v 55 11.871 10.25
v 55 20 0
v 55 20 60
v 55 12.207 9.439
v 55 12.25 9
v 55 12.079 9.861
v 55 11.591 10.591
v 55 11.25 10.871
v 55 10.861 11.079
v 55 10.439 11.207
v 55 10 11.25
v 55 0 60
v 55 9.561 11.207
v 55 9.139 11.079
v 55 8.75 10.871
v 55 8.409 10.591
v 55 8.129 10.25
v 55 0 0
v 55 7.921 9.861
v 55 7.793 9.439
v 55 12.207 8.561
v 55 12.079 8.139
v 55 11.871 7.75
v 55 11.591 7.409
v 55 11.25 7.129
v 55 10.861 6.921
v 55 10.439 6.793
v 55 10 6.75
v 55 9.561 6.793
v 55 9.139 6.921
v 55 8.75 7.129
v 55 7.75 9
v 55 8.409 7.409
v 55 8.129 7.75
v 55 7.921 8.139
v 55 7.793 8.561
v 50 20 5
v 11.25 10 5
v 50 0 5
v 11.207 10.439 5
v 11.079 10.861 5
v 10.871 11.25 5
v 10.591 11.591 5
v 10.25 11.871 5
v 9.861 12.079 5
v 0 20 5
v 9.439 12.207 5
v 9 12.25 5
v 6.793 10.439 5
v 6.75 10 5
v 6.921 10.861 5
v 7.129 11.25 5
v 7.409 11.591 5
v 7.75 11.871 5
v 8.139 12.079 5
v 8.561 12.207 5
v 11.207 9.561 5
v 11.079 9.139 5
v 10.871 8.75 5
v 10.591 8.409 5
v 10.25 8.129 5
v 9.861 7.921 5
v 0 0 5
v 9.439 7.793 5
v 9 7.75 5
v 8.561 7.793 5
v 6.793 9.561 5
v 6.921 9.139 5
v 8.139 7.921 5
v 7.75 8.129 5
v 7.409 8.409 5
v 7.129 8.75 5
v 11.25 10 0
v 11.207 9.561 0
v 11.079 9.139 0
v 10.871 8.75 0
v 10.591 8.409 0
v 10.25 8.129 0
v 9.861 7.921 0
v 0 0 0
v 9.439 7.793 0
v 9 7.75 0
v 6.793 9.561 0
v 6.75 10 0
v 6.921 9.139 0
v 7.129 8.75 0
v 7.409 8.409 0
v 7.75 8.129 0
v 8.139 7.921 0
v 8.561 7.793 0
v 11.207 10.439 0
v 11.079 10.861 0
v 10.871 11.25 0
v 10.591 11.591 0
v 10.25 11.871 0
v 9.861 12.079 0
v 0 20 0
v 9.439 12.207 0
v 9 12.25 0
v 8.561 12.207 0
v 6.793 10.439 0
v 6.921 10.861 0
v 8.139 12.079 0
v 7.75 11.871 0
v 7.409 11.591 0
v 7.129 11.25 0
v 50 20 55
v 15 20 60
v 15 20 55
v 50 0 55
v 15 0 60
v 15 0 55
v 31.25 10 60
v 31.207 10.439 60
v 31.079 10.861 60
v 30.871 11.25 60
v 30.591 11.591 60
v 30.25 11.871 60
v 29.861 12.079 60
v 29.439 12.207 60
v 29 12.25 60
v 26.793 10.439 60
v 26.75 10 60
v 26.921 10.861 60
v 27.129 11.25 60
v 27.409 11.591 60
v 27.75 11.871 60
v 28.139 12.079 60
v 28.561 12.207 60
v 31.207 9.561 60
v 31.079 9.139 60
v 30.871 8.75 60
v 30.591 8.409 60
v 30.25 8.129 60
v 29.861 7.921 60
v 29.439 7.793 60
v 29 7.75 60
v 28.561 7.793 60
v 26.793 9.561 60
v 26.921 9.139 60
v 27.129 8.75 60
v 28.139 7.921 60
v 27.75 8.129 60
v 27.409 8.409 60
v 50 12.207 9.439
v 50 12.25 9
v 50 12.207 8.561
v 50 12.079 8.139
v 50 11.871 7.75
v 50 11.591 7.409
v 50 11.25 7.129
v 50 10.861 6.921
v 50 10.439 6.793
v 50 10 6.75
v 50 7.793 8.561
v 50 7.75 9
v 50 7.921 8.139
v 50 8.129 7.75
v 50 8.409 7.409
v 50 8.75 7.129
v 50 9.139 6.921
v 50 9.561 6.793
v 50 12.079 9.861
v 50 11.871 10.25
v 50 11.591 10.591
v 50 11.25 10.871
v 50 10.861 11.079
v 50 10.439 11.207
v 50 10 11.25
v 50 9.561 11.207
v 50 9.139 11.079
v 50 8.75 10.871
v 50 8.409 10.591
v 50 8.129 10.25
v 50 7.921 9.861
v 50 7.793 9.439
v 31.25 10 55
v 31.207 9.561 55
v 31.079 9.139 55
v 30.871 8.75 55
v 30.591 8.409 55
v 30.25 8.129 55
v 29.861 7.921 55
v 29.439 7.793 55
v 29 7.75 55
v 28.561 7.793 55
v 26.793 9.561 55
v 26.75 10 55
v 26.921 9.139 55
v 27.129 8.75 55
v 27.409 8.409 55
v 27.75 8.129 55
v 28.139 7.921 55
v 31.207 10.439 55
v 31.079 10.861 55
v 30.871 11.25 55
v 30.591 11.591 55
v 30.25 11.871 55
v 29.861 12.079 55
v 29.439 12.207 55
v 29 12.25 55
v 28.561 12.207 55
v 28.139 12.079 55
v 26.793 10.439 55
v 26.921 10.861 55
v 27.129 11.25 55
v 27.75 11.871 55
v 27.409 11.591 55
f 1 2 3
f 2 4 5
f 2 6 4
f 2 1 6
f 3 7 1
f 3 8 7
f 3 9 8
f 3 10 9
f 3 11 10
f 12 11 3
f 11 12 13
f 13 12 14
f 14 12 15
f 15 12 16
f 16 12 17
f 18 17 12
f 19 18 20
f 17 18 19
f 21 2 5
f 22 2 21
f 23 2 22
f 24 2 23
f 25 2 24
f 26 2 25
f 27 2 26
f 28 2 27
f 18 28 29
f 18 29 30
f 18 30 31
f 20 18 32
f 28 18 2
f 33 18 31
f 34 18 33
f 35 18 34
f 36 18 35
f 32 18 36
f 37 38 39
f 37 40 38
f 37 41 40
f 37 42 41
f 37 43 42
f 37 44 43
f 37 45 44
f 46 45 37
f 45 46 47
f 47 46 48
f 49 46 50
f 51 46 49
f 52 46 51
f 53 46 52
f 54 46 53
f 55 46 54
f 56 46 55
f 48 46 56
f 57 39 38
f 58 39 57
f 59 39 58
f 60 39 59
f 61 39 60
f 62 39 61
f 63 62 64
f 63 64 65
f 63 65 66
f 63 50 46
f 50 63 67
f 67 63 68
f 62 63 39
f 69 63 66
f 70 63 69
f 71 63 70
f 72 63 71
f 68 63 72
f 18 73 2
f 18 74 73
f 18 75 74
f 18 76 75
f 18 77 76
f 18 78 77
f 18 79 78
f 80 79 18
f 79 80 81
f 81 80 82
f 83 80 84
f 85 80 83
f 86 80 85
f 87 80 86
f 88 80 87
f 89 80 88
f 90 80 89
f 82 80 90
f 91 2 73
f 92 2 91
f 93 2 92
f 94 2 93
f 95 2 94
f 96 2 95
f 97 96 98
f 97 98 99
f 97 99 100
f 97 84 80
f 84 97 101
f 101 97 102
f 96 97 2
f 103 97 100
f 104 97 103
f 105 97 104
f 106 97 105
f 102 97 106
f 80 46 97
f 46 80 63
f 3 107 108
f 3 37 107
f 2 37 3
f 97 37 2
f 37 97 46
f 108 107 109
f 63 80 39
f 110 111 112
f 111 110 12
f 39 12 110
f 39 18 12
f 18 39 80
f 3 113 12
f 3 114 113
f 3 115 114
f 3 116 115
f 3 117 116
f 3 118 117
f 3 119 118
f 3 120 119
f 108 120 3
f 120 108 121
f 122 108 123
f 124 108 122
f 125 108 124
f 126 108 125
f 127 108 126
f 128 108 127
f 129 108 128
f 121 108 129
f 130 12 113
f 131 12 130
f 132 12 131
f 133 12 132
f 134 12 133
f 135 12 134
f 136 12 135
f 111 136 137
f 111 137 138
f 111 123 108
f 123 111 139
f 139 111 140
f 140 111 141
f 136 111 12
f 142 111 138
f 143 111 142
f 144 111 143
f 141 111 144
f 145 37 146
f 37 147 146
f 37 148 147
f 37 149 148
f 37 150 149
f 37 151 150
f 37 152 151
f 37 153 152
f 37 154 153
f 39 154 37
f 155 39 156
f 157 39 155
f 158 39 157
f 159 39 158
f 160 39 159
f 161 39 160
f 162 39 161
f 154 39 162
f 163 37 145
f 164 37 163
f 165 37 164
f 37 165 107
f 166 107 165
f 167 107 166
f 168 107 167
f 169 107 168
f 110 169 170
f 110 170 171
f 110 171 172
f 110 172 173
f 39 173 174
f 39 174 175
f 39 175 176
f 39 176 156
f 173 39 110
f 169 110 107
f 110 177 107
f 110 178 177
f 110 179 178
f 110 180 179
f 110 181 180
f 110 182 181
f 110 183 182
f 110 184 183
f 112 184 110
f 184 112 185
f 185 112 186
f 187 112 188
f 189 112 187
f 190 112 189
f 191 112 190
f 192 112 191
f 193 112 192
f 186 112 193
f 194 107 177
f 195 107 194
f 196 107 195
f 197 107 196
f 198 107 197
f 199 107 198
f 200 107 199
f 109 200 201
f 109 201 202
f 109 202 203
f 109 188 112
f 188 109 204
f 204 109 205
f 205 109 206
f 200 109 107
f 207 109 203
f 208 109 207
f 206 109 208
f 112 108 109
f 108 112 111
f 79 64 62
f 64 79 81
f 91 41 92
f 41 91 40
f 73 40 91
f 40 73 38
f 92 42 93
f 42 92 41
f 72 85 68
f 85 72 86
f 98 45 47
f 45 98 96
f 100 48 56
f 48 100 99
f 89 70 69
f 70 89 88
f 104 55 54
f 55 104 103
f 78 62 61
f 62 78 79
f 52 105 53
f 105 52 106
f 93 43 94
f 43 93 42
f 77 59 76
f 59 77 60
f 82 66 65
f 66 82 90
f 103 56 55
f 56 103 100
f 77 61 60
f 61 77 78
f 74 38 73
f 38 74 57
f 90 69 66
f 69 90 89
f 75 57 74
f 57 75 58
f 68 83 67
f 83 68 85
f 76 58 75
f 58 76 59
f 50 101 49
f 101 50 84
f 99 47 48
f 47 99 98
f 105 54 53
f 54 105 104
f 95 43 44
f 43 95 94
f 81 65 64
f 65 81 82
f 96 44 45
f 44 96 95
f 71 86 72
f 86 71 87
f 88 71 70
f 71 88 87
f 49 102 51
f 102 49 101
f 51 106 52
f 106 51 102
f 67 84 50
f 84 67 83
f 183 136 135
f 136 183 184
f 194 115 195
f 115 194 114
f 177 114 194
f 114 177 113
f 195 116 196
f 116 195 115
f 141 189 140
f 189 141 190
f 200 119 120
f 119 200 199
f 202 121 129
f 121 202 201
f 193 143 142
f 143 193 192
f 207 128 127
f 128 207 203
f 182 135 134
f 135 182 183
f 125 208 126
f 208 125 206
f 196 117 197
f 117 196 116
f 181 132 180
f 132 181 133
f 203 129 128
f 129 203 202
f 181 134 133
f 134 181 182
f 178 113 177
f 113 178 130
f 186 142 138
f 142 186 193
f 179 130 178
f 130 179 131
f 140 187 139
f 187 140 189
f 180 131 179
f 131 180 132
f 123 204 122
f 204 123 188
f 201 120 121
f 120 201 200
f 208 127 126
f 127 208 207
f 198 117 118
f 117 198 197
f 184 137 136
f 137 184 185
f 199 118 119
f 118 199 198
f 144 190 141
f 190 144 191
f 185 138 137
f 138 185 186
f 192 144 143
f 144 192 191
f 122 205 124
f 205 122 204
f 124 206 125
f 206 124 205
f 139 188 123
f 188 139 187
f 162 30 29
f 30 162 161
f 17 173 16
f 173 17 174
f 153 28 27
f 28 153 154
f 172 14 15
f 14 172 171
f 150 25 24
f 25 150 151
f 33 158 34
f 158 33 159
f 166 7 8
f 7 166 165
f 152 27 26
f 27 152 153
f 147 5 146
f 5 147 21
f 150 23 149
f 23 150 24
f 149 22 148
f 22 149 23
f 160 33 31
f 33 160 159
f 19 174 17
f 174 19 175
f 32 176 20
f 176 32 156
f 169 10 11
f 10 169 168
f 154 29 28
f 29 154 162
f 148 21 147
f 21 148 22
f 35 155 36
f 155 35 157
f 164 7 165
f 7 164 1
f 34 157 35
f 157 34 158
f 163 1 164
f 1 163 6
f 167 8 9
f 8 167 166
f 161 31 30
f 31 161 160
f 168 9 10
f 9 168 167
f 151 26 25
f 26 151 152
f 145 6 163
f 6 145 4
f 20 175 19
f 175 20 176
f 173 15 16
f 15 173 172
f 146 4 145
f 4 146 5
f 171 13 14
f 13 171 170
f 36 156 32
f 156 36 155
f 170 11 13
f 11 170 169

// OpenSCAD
$fn = 32;

// ----------------------------------------------------------------------
// Z-bracket: 55 x 20 x 60 mm
// ----------------------------------------------------------------------

// --- parameters (mm) ---
bottom_run = 55;          // lower foot length, X
top_run = 35;             // upper foot length, X
profile_w = 20;           // bracket width, Y
height = 60;              // overall rise, Z
mat_t = 5;                // plate thickness
hole_d = 4.5;             // clearance for M4

module hole_z(px, py, z0) {
  translate([px, py, z0 - 0.5]) cylinder(h = mat_t + 1, d = hole_d);
}
module hole_x(py, pz) {
  translate([-0.5, py, pz]) rotate([0, 90, 0]) cylinder(h = mat_t + 1, d = hole_d);
}

difference() {
  union() {
    cube([bottom_run, profile_w, mat_t]);
    /* web, overlapping the lower foot */
    translate([bottom_run - mat_t, 0, 0]) cube([mat_t, profile_w, height]);
    /* upper foot, sunk into the web */
    translate([bottom_run - mat_t - top_run, 0, height - mat_t]) cube([top_run + mat_t, profile_w, mat_t]);
  }
  hole_z(9, 10, 0);
  translate([bottom_run - mat_t - 21, 0, 0]) hole_z(0, 10, height - mat_t);
  translate([bottom_run - mat_t, 0, 0]) hole_x(10, 9);
}
